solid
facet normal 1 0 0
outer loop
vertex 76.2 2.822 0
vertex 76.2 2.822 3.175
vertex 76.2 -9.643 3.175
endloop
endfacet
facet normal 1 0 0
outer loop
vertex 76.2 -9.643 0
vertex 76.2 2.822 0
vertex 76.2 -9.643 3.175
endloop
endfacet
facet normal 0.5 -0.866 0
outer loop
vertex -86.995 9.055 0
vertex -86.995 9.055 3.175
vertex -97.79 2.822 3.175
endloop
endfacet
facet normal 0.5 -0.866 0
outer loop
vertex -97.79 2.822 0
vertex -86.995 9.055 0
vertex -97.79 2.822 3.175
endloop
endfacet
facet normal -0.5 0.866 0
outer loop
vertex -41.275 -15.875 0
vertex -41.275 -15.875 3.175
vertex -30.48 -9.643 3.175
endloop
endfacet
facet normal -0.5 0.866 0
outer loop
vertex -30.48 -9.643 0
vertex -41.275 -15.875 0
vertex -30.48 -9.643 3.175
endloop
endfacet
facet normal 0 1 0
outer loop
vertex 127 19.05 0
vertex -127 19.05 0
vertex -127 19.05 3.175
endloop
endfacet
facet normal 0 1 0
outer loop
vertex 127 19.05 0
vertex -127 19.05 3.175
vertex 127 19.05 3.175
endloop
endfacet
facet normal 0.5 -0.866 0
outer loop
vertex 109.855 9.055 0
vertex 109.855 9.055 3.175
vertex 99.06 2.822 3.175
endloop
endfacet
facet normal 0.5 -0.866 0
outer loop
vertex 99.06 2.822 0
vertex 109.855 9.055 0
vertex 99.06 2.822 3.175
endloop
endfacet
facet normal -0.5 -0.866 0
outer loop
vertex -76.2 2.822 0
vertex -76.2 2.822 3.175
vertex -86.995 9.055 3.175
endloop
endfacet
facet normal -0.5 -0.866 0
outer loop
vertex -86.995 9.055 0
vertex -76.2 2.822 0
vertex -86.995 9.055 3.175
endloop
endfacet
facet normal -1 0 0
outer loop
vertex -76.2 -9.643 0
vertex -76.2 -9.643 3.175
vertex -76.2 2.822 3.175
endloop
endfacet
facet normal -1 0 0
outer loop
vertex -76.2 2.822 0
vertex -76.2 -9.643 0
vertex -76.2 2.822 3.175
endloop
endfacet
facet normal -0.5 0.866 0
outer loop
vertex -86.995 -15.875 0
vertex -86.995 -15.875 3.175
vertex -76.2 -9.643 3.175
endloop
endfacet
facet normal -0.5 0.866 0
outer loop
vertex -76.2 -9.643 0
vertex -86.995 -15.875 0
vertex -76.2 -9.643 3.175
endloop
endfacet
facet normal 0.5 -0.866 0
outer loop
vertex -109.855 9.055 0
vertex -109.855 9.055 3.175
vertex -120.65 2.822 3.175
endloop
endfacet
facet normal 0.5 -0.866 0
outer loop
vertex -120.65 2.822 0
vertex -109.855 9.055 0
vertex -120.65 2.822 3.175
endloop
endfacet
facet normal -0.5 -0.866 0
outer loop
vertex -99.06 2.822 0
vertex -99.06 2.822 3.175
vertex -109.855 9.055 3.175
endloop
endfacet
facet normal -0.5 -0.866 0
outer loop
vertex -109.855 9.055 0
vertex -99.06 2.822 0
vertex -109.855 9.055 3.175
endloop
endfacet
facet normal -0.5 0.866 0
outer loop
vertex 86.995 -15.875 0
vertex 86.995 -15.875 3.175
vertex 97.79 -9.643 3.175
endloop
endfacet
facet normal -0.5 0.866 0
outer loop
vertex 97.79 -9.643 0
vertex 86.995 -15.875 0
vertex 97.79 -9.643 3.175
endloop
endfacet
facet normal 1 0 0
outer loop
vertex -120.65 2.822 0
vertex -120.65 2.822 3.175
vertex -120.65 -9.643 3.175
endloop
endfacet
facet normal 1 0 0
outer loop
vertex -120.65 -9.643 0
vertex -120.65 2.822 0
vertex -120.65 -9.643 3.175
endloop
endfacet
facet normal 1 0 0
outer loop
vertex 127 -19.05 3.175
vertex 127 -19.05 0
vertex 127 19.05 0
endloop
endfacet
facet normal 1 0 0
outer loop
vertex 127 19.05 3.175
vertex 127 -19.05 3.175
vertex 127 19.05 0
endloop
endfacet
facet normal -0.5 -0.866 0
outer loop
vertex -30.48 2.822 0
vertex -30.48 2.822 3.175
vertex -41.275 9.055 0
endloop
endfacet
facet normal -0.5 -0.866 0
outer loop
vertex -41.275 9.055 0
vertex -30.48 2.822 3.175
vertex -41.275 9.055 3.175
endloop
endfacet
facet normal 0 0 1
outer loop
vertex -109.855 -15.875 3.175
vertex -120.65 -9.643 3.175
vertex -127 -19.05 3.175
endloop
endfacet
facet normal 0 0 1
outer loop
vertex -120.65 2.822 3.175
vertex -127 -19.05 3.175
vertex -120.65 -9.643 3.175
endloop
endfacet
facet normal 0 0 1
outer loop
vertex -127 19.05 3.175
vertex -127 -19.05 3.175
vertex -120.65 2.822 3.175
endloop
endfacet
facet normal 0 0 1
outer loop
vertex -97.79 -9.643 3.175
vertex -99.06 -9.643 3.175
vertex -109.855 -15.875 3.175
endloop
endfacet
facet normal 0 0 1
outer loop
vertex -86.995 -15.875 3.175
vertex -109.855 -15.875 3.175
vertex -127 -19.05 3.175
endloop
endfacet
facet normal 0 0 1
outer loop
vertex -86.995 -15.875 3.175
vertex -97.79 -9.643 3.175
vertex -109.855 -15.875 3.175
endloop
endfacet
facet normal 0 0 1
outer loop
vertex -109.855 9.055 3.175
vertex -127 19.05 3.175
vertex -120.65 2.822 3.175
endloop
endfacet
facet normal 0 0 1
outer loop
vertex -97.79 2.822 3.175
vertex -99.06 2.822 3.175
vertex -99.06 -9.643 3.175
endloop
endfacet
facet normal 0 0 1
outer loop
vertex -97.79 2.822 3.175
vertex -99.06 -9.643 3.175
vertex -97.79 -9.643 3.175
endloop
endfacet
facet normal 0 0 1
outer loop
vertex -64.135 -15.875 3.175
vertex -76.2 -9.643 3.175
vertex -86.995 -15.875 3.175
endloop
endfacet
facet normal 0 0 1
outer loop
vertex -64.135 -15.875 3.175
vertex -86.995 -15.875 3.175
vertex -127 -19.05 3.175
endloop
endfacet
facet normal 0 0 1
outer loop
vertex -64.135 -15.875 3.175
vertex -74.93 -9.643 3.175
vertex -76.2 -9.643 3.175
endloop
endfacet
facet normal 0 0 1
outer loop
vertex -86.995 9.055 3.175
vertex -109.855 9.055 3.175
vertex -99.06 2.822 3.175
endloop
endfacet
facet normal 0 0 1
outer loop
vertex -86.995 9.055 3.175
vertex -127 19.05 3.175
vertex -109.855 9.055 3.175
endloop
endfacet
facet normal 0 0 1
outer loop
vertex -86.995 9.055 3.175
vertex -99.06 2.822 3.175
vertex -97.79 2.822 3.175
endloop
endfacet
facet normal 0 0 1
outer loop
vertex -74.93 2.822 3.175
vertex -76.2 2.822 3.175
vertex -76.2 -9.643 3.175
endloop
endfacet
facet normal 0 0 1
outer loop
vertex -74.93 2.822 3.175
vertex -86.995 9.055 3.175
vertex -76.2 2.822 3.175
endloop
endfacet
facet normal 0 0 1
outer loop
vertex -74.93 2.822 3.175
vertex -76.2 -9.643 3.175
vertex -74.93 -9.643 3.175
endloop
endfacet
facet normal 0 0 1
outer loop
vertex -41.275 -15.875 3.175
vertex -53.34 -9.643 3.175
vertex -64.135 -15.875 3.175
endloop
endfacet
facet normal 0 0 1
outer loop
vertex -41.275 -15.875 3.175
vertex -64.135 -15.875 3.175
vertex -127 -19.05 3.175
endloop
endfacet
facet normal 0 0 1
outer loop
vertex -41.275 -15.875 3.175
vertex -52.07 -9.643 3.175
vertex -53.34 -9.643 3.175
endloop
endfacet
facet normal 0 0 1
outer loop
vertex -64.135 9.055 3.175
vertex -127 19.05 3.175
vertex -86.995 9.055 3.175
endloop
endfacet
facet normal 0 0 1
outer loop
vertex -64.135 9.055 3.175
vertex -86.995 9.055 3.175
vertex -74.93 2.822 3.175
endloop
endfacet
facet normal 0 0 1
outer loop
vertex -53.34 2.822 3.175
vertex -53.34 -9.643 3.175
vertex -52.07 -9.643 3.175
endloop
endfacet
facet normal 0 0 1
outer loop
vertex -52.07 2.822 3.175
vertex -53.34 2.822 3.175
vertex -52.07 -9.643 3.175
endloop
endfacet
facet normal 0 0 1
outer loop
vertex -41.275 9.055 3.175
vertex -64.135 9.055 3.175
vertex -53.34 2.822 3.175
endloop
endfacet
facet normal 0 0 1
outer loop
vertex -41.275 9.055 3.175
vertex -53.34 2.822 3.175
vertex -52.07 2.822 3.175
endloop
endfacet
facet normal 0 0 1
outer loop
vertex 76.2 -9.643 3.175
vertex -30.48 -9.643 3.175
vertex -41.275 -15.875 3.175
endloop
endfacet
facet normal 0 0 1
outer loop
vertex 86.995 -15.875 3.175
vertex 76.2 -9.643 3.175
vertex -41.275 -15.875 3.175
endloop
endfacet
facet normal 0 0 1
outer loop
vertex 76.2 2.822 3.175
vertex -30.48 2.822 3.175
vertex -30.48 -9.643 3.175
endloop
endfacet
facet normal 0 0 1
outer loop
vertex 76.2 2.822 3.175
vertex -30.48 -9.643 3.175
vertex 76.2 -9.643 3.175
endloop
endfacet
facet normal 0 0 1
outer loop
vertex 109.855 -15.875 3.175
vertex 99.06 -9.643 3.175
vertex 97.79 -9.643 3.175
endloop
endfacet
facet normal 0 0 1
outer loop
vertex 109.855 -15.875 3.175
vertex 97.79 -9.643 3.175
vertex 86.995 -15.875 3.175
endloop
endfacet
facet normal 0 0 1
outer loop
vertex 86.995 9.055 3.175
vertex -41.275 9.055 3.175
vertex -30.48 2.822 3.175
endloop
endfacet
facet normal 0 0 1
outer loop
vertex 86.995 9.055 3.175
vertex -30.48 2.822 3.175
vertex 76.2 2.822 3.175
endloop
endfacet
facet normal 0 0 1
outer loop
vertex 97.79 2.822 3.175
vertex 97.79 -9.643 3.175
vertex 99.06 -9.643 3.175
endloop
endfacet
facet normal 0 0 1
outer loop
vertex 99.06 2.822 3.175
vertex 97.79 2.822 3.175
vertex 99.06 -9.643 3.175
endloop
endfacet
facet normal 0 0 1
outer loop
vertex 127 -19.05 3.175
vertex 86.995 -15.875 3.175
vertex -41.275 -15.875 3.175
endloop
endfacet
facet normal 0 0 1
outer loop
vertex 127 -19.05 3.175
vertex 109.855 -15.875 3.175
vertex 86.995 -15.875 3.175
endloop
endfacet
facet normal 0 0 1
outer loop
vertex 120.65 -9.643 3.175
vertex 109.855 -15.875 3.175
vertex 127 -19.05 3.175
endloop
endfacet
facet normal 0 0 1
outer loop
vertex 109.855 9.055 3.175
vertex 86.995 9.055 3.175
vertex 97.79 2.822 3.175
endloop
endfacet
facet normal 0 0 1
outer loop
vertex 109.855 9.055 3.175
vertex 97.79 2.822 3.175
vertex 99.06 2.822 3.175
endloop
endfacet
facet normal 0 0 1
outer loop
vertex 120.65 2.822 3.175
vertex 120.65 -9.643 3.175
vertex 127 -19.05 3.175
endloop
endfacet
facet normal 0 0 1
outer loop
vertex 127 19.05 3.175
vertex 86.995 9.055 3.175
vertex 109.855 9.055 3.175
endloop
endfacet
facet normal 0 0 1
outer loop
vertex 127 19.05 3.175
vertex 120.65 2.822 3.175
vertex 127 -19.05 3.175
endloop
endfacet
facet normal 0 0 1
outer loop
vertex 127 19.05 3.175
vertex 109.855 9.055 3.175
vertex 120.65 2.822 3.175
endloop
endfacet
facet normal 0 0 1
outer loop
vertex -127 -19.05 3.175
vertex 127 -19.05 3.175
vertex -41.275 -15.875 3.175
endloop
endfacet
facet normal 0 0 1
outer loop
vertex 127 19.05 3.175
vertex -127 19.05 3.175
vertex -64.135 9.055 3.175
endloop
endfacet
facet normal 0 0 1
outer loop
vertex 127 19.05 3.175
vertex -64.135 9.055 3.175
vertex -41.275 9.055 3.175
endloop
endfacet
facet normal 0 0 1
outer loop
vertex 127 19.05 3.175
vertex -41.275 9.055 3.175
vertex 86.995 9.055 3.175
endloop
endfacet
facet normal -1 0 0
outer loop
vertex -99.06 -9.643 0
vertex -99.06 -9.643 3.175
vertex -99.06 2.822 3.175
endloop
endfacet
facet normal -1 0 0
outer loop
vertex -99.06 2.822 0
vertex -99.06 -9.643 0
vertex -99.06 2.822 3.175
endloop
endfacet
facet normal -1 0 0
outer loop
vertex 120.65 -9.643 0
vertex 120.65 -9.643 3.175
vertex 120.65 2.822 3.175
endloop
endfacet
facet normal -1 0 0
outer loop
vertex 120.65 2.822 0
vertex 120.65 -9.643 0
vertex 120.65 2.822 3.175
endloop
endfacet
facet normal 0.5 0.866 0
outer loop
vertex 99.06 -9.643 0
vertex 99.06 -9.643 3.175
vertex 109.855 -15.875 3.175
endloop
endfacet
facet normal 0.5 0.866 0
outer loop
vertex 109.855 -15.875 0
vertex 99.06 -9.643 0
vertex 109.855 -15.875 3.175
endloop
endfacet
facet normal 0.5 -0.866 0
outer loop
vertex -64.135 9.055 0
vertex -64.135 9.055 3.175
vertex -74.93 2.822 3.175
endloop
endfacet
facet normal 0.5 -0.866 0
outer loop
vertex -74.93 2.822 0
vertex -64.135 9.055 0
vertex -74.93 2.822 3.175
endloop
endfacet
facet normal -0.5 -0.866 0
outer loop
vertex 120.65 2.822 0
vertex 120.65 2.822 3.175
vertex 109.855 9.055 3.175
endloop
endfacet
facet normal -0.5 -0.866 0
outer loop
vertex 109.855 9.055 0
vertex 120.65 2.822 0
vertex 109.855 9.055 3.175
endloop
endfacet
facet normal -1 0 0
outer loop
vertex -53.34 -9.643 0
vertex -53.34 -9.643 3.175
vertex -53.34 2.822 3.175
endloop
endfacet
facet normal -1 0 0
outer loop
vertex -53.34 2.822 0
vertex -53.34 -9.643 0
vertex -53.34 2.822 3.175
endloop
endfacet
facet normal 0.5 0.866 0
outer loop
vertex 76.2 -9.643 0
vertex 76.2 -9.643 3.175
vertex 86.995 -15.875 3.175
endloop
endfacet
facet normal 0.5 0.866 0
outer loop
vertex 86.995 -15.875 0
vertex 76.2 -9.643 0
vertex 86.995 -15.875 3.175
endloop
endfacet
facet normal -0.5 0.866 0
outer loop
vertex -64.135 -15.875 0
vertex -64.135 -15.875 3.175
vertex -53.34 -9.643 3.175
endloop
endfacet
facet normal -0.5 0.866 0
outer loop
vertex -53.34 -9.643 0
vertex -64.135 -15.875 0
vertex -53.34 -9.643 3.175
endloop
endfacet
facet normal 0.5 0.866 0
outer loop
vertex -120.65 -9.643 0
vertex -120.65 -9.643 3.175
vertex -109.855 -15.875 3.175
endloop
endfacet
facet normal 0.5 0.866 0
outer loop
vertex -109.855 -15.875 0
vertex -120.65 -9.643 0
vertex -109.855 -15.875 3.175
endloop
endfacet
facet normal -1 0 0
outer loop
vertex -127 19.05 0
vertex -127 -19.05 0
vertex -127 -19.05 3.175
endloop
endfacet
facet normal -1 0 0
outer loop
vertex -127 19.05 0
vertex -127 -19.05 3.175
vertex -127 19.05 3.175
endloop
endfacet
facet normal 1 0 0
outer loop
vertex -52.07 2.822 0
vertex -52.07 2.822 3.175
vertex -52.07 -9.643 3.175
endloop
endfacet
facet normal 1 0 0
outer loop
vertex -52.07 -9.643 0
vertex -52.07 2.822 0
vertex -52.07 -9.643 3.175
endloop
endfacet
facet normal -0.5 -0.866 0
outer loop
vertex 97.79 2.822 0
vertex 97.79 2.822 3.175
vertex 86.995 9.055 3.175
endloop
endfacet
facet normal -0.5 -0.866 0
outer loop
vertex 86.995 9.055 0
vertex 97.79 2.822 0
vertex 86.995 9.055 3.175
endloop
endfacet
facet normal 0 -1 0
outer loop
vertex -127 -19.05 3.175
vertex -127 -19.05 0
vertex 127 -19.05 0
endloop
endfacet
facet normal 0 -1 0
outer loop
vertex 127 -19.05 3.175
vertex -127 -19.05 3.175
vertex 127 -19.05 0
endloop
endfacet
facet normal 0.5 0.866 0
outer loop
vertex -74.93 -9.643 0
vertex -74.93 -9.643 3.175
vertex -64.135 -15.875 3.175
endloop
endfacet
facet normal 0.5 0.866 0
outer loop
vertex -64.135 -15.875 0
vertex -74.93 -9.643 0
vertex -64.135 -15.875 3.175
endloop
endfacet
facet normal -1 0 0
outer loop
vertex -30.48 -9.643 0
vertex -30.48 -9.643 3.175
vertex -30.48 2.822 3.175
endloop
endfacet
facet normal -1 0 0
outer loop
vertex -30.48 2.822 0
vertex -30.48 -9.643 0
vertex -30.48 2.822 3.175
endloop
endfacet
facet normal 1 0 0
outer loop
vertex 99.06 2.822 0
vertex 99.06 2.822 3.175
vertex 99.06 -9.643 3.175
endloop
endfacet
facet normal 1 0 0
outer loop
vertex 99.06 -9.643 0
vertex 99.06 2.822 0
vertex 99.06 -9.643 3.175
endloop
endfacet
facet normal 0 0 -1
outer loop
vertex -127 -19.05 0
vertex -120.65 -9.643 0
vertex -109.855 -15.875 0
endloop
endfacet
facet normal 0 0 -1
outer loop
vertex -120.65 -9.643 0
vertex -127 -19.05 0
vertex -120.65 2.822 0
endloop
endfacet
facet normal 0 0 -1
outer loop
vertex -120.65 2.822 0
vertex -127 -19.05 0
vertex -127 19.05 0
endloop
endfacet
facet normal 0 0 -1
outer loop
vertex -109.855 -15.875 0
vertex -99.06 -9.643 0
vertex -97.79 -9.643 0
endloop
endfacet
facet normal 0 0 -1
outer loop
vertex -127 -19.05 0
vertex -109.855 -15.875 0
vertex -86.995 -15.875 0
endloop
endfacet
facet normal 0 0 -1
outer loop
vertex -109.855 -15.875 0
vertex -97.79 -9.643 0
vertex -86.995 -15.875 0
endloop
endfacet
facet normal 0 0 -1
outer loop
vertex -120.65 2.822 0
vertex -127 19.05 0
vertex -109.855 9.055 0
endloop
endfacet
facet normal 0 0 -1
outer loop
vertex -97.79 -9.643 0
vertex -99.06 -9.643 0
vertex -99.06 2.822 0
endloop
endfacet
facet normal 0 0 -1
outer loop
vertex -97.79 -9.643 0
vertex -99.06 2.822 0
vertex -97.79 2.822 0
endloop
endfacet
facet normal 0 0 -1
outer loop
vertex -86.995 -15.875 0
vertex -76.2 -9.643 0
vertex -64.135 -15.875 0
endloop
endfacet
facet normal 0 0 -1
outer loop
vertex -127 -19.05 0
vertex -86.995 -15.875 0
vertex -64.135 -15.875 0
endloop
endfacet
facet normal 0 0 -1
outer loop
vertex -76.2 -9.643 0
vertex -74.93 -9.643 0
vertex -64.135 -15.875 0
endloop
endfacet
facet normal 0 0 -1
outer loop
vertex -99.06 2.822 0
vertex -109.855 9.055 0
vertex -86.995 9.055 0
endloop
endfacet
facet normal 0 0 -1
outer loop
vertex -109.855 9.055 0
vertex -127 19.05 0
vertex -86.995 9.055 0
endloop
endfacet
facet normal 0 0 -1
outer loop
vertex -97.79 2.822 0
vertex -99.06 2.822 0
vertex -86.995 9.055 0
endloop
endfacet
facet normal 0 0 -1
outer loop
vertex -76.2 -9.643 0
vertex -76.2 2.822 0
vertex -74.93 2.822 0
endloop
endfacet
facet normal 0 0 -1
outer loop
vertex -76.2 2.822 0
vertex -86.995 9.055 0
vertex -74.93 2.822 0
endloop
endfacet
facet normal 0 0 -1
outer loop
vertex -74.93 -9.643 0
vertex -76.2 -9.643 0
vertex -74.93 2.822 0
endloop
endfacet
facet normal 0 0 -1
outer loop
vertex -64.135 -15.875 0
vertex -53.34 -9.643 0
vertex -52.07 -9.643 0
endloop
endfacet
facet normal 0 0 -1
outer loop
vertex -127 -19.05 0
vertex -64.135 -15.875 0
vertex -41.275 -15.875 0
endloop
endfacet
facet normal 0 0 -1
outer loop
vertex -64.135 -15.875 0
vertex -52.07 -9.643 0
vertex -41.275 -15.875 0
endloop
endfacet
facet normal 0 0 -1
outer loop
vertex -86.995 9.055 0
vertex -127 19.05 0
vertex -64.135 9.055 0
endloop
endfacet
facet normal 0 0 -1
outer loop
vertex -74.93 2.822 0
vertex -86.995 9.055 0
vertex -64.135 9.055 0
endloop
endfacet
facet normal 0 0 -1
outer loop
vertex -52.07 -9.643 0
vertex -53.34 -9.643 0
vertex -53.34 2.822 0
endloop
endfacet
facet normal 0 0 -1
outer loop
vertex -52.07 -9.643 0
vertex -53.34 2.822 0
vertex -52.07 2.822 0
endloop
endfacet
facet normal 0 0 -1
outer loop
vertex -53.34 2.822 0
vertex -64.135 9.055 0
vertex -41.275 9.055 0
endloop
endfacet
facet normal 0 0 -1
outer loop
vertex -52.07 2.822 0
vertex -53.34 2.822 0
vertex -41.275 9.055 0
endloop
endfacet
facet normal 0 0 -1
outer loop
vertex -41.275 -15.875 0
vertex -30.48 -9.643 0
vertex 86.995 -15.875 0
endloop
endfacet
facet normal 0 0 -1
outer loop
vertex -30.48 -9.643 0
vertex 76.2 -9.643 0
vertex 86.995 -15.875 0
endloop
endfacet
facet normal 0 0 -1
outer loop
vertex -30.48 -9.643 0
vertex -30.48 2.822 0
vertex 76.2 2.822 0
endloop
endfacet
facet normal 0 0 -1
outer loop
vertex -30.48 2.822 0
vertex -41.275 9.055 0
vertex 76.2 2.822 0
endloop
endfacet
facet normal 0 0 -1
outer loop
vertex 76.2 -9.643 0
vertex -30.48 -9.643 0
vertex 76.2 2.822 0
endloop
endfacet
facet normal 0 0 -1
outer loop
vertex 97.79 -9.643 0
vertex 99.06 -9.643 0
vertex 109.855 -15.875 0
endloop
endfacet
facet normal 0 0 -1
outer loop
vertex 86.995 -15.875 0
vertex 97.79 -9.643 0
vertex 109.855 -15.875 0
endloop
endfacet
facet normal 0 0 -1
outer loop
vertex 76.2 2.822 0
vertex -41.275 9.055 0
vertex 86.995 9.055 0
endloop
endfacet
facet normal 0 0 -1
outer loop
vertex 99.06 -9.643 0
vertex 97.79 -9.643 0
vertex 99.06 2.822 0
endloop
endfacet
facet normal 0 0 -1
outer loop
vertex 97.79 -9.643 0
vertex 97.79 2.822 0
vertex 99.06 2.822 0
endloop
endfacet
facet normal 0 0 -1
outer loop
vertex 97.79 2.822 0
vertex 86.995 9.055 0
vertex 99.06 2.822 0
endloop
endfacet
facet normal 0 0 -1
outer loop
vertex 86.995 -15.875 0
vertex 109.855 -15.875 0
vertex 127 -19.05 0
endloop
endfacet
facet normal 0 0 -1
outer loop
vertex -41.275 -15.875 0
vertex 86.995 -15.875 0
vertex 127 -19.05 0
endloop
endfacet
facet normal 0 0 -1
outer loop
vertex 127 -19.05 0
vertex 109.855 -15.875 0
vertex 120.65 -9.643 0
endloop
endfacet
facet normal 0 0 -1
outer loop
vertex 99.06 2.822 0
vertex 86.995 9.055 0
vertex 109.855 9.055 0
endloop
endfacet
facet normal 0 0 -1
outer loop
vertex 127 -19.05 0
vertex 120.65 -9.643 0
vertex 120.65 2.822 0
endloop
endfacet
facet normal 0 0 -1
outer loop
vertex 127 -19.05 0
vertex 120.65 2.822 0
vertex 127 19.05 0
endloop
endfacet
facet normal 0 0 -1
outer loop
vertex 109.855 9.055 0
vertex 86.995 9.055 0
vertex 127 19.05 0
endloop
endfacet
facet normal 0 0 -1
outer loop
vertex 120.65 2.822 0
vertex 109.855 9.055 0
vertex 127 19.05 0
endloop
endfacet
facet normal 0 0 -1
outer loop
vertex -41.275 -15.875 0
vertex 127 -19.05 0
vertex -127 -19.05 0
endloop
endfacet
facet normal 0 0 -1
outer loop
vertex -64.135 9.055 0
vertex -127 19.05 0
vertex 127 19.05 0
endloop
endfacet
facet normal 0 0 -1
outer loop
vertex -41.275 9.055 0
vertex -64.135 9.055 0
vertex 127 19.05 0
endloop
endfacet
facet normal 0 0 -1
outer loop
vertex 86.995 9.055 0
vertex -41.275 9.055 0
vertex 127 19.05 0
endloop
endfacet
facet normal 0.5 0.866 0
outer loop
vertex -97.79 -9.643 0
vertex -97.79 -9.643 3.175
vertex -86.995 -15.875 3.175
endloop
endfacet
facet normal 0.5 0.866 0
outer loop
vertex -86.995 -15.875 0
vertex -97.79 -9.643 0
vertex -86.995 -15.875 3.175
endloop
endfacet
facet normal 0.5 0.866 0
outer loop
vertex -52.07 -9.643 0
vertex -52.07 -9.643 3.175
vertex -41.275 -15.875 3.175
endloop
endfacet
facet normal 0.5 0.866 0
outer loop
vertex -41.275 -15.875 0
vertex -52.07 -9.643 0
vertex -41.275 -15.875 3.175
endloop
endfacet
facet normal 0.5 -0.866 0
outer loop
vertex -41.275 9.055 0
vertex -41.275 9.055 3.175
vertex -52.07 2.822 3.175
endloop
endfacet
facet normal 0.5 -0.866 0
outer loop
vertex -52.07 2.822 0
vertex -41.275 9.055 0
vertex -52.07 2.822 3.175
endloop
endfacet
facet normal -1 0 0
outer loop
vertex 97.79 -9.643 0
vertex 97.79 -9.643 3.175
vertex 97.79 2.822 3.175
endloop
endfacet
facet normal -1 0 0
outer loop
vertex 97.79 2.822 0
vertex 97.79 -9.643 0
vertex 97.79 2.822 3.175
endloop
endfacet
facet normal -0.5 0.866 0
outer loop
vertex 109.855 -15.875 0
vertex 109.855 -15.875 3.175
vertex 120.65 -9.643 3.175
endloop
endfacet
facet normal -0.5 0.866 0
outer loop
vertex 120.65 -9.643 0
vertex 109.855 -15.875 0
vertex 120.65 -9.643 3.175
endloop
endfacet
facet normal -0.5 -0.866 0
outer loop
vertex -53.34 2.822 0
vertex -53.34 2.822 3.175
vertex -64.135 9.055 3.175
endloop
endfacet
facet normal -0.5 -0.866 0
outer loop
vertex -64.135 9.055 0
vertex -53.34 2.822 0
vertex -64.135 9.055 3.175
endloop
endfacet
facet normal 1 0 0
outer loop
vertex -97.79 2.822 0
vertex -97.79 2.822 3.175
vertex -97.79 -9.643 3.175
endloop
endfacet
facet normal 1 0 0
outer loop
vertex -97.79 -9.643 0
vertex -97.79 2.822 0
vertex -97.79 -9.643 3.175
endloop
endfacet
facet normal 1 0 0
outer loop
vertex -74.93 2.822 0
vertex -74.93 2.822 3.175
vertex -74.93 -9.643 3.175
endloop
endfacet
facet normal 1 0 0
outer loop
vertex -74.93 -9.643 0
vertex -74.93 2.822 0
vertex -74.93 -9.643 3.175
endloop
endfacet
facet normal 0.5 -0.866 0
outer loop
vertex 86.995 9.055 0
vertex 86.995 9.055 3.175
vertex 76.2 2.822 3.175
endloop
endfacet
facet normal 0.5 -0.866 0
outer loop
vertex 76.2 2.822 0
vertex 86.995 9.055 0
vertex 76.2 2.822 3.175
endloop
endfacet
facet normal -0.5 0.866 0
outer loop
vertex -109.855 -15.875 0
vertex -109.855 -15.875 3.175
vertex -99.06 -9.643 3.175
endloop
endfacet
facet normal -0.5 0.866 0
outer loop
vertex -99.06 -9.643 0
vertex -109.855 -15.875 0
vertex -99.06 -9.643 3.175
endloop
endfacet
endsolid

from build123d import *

# Parameters (mm, degrees)
SKETCH1_W           = 254
SKETCH1_H           = 38.1
BOSS_EXTRUDE1_DEPTH = 3.175
CUT_EXTRUDE1_DEPTH  = 10.414


with BuildPart() as part:
    # Sketch1 → Boss-Extrude1 (new body)
    with BuildSketch(Plane.XY):
        Rectangle(SKETCH1_W, SKETCH1_H)
    extrude(amount=BOSS_EXTRUDE1_DEPTH)

    # Sketch4 → Cut-Extrude1 (cut)
    with BuildSketch(Plane.XY.offset(3.175)):
        Polygon((-99.060120052, -9.6425385), (-99.060120052, 2.8223845), (-109.855060026, 9.054846), (-120.65, 2.8223845), (-120.65, -9.6425385), (-109.855060026, -15.875), align=None)
        Polygon((-76.200120052, -9.6425385), (-76.200120052, 2.8223845), (-86.995060026, 9.054846), (-97.79, 2.8223845), (-97.79, -9.6425385), (-86.995060026, -15.875), align=None)
        Polygon((-53.340120052, -9.6425385), (-53.340120052, 2.8223845), (-64.135060026, 9.054846), (-74.93, 2.8223845), (-74.93, -9.6425385), (-64.135060026, -15.875), align=None)
        Polygon((-30.480120052, -9.6425385), (-30.480120052, 2.8223845), (-41.275060026, 9.054846), (-52.07, 2.8223845), (-52.07, -9.6425385), (-41.275060026, -15.875), align=None)
        Polygon((120.65, -9.6425385), (120.65, 2.8223845), (109.855060026, 9.054846), (99.060120052, 2.8223845), (99.060120052, -9.6425385), (109.855060026, -15.875), align=None)
        Polygon((97.79, -9.6425385), (97.79, 2.8223845), (86.995060026, 9.054846), (76.200120052, 2.8223845), (76.200120052, -9.6425385), (86.995060026, -15.875), align=None)
    extrude(amount=-CUT_EXTRUDE1_DEPTH, mode=Mode.SUBTRACT)


solid = part.part
